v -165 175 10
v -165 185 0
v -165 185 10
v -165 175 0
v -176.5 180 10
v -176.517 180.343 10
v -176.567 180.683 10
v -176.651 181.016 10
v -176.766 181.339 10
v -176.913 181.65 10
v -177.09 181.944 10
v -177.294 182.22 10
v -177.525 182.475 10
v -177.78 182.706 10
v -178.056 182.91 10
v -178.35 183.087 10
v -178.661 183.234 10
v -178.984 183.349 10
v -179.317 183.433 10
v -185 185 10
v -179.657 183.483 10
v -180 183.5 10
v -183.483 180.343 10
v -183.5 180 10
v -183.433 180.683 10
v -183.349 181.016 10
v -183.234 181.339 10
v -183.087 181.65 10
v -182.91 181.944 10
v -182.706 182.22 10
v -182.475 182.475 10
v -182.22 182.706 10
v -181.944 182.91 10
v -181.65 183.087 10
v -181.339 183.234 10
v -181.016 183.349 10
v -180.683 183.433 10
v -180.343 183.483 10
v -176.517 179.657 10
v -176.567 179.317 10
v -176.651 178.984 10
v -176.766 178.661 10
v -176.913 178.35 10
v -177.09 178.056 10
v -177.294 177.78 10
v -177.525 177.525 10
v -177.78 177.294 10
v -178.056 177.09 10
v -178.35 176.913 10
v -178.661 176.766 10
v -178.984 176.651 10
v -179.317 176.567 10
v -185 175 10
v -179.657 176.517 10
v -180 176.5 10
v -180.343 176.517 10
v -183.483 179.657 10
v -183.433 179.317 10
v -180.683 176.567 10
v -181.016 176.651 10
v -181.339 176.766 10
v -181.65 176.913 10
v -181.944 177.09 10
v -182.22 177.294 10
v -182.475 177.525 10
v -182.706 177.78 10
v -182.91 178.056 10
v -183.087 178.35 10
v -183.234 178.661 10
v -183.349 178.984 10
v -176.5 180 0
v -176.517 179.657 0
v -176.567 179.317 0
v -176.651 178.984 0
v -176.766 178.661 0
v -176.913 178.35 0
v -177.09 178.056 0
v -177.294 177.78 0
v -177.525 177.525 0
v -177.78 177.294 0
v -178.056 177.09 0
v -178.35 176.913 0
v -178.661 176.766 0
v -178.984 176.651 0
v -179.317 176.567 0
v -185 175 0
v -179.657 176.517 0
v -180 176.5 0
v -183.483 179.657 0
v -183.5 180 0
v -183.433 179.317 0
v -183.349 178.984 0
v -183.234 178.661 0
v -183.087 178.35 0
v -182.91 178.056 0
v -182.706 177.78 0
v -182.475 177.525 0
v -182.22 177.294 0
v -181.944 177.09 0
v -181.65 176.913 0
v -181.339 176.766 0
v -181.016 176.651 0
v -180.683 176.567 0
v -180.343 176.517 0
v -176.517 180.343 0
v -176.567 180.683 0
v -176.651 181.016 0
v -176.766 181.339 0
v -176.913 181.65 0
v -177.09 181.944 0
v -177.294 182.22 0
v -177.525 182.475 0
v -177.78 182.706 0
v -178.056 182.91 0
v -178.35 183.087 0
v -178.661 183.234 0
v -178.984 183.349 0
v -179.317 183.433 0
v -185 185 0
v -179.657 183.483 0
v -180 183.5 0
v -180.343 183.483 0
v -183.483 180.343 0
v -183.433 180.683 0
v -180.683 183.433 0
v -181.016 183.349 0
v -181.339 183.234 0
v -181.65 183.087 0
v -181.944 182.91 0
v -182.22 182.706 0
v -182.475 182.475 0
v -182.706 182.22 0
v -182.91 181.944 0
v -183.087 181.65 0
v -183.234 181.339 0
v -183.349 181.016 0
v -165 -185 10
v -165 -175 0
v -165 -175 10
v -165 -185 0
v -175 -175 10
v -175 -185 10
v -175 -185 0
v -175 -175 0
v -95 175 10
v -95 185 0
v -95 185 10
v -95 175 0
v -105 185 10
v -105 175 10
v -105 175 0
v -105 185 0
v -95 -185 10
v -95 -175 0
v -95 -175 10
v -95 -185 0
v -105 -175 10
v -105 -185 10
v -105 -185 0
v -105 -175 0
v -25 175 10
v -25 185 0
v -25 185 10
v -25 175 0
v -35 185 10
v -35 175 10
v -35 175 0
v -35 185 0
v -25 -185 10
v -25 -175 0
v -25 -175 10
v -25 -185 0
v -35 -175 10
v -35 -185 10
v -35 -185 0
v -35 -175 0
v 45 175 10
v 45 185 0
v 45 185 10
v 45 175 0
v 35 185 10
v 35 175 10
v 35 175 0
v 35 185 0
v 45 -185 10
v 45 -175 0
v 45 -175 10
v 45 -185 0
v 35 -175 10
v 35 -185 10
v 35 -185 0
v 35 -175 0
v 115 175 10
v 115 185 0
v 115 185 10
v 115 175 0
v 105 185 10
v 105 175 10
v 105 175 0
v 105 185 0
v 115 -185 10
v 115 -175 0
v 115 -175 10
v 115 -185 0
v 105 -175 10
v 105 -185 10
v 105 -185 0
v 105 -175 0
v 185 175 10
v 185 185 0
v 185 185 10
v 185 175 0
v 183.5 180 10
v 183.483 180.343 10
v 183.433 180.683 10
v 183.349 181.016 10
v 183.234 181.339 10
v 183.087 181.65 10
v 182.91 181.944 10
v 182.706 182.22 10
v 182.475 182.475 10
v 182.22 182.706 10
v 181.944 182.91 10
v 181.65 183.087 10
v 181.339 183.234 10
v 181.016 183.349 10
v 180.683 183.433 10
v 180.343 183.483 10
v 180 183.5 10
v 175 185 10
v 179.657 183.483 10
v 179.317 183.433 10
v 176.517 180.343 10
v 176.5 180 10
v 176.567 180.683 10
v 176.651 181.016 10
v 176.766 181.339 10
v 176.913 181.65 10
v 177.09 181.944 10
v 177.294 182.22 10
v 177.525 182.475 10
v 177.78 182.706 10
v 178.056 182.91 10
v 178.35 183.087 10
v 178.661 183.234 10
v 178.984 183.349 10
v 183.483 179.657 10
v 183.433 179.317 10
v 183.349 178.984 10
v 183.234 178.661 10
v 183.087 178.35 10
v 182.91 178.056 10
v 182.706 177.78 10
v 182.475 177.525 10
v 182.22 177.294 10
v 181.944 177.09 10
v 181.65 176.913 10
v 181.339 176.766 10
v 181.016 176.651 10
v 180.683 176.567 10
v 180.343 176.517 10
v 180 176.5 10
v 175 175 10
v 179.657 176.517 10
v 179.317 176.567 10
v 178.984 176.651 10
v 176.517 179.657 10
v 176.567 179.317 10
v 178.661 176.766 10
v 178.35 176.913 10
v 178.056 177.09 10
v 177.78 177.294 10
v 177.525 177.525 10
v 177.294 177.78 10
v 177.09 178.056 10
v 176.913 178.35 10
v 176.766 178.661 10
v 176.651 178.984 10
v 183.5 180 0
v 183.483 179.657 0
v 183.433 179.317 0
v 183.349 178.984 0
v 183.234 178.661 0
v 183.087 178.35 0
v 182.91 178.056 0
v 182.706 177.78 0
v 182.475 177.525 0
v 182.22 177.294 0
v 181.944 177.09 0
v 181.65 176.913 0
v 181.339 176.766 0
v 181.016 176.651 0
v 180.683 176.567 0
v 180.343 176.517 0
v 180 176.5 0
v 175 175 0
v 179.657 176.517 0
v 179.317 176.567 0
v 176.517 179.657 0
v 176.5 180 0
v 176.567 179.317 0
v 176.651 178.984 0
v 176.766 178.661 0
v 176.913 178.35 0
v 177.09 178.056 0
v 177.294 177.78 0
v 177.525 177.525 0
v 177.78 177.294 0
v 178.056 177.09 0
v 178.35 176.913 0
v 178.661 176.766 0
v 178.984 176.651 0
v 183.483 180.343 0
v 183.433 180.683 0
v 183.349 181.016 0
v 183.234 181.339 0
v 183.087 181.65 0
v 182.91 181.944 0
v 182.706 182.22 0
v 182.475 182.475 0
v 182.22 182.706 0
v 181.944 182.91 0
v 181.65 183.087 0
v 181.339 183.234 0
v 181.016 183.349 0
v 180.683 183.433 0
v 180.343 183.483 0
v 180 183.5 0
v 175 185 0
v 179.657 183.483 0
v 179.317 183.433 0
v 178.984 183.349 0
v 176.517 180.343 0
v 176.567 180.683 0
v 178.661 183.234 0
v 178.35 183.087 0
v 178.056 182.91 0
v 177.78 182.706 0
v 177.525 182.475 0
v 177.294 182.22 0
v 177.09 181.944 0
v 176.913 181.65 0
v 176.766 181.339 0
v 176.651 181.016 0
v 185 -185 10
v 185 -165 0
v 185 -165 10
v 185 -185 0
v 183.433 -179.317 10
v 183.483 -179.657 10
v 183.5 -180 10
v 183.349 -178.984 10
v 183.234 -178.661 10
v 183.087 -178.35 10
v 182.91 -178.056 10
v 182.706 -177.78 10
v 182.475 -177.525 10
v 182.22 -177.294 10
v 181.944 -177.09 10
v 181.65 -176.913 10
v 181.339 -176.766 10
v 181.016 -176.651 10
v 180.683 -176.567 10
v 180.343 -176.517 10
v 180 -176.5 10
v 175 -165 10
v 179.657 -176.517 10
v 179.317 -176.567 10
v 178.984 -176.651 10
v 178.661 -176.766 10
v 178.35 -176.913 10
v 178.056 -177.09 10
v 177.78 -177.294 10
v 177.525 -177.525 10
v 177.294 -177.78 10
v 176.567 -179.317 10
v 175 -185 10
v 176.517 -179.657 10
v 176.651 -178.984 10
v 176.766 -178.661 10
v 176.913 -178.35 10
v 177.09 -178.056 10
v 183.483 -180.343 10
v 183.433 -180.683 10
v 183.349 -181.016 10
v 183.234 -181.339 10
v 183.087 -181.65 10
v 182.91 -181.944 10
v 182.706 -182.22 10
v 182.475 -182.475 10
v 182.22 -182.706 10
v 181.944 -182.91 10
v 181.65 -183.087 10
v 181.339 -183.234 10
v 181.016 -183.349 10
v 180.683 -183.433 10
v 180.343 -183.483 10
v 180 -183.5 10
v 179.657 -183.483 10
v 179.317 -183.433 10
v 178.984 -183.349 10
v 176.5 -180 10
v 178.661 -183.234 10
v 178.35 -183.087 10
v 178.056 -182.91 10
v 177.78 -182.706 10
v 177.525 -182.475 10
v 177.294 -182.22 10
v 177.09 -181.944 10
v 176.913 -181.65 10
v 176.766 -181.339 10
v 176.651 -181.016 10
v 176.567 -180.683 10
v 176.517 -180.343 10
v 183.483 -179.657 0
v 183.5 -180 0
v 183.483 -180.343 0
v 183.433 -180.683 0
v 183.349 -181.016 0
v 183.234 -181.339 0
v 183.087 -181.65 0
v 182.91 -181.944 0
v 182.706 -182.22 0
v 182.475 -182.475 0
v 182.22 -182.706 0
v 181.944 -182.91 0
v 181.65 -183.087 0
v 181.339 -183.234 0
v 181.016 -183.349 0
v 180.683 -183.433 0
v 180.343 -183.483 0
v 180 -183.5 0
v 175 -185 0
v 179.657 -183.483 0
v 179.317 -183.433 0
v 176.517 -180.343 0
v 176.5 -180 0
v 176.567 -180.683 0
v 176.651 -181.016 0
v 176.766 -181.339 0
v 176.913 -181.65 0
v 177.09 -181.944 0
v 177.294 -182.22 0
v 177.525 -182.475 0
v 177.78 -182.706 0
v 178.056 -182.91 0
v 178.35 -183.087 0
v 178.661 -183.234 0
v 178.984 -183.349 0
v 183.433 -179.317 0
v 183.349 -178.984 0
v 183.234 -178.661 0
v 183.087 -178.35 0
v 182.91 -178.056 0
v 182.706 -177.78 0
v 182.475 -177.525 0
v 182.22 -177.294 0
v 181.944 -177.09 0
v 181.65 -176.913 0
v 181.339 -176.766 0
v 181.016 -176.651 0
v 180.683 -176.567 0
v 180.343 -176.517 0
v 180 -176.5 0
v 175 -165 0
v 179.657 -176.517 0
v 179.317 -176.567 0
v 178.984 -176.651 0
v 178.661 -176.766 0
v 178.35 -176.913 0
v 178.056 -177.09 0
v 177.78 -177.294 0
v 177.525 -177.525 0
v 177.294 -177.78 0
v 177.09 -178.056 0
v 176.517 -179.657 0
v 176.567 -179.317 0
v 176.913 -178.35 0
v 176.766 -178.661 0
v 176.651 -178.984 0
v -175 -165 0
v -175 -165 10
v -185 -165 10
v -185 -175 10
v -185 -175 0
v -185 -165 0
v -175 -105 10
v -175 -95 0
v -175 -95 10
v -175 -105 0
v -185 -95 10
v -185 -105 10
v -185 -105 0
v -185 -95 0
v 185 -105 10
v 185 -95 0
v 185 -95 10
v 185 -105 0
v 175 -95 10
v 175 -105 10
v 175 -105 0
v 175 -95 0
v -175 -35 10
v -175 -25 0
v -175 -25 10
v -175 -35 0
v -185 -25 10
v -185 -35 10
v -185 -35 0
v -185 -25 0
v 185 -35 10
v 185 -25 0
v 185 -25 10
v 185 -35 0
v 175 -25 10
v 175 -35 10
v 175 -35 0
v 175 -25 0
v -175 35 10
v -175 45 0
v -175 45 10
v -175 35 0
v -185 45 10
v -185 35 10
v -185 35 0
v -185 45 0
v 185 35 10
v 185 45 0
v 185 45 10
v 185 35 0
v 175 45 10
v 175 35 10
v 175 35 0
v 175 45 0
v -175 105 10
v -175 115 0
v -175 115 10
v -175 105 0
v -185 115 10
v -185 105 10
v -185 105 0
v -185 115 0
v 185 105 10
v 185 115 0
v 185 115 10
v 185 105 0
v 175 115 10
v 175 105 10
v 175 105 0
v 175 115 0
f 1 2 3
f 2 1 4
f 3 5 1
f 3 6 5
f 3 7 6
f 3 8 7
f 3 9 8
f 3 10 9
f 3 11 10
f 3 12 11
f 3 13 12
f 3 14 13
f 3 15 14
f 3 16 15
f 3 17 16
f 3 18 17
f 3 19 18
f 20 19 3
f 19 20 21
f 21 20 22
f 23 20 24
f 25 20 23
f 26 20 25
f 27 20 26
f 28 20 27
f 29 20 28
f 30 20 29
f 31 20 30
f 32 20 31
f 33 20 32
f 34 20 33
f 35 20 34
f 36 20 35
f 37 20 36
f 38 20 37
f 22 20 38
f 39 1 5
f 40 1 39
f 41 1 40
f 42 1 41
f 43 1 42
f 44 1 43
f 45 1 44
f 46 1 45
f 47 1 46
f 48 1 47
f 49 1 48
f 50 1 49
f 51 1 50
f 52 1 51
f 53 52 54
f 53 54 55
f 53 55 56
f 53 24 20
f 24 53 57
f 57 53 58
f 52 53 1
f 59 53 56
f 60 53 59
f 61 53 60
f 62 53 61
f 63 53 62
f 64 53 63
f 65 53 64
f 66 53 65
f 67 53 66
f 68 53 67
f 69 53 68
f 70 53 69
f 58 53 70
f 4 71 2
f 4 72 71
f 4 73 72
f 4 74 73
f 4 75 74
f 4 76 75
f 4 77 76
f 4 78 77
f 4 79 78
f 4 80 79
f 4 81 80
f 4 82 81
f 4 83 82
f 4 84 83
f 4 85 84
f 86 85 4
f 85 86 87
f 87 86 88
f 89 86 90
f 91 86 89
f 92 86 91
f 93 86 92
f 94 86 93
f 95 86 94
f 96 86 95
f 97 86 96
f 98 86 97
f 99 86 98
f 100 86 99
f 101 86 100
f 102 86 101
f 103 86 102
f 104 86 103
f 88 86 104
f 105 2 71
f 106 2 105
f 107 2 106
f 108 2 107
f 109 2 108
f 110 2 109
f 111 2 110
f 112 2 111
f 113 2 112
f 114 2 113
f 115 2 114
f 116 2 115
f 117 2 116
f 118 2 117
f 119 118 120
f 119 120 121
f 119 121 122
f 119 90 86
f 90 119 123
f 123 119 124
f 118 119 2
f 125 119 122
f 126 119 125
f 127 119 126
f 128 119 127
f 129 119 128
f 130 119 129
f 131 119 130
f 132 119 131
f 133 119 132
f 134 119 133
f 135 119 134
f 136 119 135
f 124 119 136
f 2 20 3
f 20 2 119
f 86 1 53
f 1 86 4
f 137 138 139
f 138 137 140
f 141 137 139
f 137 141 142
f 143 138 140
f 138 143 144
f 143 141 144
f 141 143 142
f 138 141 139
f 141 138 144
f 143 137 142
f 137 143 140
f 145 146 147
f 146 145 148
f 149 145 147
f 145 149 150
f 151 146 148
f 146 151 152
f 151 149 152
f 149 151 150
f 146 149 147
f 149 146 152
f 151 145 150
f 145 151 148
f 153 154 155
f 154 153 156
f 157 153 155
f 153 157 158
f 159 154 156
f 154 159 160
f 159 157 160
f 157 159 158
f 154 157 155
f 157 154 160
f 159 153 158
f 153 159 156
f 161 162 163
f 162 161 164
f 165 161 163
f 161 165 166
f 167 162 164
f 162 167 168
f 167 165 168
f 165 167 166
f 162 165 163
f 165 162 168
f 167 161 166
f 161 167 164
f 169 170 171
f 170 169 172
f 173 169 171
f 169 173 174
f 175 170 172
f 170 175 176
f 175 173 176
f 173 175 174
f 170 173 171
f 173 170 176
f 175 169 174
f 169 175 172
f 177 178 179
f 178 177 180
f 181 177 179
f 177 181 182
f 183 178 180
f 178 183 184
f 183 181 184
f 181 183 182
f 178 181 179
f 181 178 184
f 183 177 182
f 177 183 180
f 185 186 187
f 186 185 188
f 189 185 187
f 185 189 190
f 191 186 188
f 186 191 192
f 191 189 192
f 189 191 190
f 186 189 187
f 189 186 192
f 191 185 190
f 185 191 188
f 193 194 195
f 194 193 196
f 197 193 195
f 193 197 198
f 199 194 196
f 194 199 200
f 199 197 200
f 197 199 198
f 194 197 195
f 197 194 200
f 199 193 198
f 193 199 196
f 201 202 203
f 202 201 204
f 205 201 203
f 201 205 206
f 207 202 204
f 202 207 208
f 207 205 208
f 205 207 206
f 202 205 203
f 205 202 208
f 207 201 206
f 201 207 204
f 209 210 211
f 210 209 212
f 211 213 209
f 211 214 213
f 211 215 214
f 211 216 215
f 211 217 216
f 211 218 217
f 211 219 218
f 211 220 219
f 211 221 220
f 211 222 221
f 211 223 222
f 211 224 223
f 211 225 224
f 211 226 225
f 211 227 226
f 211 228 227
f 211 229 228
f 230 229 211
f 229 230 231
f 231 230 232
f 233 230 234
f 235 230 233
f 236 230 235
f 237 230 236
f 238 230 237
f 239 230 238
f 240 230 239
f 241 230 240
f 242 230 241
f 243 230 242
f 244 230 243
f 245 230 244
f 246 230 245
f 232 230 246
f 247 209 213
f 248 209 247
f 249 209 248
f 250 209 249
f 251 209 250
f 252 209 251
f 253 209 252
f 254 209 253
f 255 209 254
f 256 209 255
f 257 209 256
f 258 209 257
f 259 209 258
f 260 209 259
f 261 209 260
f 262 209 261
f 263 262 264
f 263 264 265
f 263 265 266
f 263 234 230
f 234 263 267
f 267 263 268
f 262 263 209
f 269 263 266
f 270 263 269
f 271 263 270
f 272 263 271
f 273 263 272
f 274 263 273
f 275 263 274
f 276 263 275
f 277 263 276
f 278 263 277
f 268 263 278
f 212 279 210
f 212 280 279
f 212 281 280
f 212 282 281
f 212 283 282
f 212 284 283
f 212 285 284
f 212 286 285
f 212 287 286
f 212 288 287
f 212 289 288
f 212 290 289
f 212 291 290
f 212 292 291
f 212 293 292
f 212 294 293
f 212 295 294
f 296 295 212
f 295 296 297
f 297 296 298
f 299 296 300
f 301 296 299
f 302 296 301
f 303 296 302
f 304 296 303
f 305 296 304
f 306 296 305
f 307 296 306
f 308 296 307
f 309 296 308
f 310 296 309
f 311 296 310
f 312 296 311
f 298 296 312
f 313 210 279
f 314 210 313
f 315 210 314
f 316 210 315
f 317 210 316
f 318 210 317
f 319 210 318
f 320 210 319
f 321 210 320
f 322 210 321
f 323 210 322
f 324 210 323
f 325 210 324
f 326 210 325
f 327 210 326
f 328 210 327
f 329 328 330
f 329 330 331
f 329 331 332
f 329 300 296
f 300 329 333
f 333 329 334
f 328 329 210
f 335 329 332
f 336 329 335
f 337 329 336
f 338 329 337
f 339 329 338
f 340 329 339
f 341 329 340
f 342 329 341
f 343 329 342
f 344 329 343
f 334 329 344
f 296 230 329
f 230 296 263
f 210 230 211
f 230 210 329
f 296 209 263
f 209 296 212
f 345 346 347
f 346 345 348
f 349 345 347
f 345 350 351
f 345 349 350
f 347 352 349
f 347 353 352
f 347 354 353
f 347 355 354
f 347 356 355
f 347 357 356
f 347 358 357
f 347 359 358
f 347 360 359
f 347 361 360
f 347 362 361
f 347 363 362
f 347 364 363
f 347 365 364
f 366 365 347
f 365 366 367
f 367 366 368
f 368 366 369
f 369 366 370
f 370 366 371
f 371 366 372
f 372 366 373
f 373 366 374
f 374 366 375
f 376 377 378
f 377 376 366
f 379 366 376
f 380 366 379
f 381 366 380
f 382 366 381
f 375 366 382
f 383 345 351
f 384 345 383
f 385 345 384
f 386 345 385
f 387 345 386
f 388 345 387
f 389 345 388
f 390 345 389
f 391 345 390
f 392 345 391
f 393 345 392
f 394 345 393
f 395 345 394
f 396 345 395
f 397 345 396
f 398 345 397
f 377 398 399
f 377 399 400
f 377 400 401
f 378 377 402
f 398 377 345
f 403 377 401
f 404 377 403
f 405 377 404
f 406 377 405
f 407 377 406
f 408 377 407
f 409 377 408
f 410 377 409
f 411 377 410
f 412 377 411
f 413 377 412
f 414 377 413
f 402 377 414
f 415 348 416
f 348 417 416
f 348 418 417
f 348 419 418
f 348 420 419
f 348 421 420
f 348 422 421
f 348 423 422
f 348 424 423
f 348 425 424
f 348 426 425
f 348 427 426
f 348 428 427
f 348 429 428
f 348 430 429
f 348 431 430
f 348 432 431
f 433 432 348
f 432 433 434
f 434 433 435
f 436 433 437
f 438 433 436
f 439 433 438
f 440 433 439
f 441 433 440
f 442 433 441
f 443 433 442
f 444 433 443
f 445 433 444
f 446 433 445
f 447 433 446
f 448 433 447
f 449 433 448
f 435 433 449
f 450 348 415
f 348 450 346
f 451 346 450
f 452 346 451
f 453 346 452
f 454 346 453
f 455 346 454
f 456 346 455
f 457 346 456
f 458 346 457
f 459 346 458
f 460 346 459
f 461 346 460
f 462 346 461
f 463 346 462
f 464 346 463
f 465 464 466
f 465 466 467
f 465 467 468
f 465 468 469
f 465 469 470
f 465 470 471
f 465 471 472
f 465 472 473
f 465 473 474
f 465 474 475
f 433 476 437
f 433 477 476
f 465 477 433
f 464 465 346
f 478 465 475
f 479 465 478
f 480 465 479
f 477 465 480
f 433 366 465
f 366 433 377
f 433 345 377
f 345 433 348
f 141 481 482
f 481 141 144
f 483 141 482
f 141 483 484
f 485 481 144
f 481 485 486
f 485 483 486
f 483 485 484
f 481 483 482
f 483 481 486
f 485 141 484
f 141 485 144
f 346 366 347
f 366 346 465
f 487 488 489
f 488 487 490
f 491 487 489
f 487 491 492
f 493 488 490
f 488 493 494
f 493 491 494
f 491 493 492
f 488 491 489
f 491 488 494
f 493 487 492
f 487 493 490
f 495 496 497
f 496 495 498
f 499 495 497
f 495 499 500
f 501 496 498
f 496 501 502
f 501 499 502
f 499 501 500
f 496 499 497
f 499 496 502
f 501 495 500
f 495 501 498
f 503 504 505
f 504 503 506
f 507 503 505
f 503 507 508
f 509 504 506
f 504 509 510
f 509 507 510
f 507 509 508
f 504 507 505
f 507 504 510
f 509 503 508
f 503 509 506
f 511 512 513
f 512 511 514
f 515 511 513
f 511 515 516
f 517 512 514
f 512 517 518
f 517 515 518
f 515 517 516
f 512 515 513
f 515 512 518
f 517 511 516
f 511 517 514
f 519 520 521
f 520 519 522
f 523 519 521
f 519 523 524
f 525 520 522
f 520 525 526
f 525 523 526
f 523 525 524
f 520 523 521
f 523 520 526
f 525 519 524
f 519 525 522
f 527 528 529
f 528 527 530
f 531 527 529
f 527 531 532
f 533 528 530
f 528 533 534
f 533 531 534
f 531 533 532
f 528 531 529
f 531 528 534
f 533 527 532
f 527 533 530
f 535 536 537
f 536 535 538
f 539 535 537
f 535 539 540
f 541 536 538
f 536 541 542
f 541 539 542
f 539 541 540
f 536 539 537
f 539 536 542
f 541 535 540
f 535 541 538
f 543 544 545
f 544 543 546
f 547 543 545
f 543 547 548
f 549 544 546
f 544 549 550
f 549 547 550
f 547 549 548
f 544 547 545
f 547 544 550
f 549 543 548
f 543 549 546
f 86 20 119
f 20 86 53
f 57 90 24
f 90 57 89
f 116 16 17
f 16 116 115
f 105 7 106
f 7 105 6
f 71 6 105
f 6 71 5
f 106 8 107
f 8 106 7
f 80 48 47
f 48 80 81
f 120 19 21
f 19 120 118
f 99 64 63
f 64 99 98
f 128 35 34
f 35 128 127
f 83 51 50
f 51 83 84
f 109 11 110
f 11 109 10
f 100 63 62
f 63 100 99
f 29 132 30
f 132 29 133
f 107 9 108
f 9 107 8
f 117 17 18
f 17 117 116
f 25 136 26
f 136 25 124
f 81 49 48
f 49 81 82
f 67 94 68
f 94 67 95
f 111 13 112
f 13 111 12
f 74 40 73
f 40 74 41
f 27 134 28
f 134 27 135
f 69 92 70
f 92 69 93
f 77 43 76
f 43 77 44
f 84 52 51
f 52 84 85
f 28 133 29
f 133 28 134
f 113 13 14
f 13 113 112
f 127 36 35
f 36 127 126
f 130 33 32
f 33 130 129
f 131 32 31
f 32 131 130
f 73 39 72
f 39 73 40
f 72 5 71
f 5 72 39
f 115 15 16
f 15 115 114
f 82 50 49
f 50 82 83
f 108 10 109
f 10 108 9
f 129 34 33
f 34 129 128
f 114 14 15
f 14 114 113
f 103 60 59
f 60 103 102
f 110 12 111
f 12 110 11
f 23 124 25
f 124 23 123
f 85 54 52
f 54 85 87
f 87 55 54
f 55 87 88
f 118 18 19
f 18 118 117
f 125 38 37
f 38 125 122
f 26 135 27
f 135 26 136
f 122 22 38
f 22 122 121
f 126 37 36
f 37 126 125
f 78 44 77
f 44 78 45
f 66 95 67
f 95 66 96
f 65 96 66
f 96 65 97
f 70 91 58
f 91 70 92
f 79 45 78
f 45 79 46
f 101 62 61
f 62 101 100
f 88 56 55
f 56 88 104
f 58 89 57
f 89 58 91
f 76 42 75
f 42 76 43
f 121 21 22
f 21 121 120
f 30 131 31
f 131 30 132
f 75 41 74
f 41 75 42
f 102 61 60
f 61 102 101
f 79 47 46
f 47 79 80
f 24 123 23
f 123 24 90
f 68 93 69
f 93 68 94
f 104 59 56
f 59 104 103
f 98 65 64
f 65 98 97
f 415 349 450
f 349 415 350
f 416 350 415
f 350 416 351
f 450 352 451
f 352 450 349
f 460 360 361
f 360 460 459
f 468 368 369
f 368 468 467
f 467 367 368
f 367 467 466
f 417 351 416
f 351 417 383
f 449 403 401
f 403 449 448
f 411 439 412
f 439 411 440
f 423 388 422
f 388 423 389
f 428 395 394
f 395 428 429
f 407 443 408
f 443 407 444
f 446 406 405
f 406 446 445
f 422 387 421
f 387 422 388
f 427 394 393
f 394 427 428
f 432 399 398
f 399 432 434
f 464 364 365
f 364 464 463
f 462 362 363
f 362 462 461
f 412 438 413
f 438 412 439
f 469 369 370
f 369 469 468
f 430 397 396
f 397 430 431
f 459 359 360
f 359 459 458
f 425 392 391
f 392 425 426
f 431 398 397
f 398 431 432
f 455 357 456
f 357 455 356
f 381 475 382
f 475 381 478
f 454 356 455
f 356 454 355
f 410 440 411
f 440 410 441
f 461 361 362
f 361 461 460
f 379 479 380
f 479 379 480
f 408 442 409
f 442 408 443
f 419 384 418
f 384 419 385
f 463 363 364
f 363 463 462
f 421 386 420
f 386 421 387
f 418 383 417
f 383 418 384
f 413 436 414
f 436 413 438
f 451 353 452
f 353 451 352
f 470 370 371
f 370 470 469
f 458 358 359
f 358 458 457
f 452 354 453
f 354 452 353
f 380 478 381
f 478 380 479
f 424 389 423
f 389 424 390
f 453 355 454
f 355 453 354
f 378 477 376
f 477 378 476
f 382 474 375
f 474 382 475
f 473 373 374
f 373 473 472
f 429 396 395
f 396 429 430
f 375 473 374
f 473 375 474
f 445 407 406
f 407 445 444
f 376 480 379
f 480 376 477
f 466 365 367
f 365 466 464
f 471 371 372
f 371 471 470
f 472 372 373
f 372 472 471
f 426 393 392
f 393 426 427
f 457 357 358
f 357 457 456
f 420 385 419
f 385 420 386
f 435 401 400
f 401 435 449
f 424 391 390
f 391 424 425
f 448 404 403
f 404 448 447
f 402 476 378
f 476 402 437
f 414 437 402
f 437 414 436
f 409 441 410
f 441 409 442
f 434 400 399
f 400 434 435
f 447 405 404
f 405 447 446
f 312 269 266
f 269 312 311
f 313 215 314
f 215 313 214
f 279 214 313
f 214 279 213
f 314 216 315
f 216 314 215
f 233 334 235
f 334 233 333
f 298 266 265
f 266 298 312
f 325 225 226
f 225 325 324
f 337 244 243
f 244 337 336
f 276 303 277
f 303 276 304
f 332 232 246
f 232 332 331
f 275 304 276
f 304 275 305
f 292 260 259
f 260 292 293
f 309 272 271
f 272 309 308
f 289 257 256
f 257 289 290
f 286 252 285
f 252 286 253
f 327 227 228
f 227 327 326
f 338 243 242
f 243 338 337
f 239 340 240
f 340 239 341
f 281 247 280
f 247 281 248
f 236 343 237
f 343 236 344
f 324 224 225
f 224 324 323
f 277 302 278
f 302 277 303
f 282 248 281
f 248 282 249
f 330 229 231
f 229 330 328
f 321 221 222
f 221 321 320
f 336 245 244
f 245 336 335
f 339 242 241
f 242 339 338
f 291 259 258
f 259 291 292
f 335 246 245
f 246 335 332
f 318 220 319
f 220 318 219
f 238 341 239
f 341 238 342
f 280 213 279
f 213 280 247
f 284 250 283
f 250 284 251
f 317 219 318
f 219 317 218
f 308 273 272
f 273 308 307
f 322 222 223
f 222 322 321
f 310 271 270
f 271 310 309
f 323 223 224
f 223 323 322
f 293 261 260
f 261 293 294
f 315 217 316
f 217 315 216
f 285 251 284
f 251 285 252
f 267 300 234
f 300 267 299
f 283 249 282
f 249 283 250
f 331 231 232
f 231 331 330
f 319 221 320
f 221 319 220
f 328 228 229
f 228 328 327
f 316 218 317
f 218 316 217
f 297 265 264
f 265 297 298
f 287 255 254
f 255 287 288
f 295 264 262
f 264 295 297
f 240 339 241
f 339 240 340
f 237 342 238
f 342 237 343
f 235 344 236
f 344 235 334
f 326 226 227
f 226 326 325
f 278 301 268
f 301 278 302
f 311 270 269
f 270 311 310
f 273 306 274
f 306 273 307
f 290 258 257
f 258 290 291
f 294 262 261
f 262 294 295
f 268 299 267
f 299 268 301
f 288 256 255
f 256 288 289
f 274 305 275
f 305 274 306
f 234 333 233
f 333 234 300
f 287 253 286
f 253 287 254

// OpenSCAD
// ring_62.scad - ring index 62 (z bottom = 620 mm)
$fn = 64; bar = 10; half_b = bar/2; outer = 370; half_outer = outer/2;
front_y = 180; back_y = -180; left_x = -180; right_x = 180;
x_centers = [-170, -100, -30, 40, 110, 180];
z_centers = [5, 85, 155, 225, 295, 365, 435, 505, 575, 645, 715]; ring_z = 620;
module place_box(cx, cy, sx, sy) { translate([cx - sx/2, cy - sy/2, 0]) cube([sx, sy, bar]); }

difference() { union() {
    for (x = x_centers) { place_box(x, front_y, bar, bar); place_box(x, back_y, bar, bar); }
    for (y = x_centers) { place_box(left_x, y, bar, bar); place_box(right_x, y, bar, bar); }
    for (zc = z_centers) if ((zc - half_b < ring_z + bar) && (zc + half_b > ring_z)) {
        translate([-half_outer, front_y - half_b, 0]) cube([outer, bar, bar]);
        translate([-half_outer, back_y - half_b, 0])  cube([outer, bar, bar]);
        translate([left_x - half_b, -half_outer, 0])  cube([bar, outer, bar]);
        translate([right_x - half_b, -half_outer, 0]) cube([bar, outer, bar]);
    }
  }
  for (cx = [-180, 180]) for (cy = [-180, 180]) translate([cx, cy, 0]) cylinder(h = bar, r = 3.5, $fn = 64);
}
